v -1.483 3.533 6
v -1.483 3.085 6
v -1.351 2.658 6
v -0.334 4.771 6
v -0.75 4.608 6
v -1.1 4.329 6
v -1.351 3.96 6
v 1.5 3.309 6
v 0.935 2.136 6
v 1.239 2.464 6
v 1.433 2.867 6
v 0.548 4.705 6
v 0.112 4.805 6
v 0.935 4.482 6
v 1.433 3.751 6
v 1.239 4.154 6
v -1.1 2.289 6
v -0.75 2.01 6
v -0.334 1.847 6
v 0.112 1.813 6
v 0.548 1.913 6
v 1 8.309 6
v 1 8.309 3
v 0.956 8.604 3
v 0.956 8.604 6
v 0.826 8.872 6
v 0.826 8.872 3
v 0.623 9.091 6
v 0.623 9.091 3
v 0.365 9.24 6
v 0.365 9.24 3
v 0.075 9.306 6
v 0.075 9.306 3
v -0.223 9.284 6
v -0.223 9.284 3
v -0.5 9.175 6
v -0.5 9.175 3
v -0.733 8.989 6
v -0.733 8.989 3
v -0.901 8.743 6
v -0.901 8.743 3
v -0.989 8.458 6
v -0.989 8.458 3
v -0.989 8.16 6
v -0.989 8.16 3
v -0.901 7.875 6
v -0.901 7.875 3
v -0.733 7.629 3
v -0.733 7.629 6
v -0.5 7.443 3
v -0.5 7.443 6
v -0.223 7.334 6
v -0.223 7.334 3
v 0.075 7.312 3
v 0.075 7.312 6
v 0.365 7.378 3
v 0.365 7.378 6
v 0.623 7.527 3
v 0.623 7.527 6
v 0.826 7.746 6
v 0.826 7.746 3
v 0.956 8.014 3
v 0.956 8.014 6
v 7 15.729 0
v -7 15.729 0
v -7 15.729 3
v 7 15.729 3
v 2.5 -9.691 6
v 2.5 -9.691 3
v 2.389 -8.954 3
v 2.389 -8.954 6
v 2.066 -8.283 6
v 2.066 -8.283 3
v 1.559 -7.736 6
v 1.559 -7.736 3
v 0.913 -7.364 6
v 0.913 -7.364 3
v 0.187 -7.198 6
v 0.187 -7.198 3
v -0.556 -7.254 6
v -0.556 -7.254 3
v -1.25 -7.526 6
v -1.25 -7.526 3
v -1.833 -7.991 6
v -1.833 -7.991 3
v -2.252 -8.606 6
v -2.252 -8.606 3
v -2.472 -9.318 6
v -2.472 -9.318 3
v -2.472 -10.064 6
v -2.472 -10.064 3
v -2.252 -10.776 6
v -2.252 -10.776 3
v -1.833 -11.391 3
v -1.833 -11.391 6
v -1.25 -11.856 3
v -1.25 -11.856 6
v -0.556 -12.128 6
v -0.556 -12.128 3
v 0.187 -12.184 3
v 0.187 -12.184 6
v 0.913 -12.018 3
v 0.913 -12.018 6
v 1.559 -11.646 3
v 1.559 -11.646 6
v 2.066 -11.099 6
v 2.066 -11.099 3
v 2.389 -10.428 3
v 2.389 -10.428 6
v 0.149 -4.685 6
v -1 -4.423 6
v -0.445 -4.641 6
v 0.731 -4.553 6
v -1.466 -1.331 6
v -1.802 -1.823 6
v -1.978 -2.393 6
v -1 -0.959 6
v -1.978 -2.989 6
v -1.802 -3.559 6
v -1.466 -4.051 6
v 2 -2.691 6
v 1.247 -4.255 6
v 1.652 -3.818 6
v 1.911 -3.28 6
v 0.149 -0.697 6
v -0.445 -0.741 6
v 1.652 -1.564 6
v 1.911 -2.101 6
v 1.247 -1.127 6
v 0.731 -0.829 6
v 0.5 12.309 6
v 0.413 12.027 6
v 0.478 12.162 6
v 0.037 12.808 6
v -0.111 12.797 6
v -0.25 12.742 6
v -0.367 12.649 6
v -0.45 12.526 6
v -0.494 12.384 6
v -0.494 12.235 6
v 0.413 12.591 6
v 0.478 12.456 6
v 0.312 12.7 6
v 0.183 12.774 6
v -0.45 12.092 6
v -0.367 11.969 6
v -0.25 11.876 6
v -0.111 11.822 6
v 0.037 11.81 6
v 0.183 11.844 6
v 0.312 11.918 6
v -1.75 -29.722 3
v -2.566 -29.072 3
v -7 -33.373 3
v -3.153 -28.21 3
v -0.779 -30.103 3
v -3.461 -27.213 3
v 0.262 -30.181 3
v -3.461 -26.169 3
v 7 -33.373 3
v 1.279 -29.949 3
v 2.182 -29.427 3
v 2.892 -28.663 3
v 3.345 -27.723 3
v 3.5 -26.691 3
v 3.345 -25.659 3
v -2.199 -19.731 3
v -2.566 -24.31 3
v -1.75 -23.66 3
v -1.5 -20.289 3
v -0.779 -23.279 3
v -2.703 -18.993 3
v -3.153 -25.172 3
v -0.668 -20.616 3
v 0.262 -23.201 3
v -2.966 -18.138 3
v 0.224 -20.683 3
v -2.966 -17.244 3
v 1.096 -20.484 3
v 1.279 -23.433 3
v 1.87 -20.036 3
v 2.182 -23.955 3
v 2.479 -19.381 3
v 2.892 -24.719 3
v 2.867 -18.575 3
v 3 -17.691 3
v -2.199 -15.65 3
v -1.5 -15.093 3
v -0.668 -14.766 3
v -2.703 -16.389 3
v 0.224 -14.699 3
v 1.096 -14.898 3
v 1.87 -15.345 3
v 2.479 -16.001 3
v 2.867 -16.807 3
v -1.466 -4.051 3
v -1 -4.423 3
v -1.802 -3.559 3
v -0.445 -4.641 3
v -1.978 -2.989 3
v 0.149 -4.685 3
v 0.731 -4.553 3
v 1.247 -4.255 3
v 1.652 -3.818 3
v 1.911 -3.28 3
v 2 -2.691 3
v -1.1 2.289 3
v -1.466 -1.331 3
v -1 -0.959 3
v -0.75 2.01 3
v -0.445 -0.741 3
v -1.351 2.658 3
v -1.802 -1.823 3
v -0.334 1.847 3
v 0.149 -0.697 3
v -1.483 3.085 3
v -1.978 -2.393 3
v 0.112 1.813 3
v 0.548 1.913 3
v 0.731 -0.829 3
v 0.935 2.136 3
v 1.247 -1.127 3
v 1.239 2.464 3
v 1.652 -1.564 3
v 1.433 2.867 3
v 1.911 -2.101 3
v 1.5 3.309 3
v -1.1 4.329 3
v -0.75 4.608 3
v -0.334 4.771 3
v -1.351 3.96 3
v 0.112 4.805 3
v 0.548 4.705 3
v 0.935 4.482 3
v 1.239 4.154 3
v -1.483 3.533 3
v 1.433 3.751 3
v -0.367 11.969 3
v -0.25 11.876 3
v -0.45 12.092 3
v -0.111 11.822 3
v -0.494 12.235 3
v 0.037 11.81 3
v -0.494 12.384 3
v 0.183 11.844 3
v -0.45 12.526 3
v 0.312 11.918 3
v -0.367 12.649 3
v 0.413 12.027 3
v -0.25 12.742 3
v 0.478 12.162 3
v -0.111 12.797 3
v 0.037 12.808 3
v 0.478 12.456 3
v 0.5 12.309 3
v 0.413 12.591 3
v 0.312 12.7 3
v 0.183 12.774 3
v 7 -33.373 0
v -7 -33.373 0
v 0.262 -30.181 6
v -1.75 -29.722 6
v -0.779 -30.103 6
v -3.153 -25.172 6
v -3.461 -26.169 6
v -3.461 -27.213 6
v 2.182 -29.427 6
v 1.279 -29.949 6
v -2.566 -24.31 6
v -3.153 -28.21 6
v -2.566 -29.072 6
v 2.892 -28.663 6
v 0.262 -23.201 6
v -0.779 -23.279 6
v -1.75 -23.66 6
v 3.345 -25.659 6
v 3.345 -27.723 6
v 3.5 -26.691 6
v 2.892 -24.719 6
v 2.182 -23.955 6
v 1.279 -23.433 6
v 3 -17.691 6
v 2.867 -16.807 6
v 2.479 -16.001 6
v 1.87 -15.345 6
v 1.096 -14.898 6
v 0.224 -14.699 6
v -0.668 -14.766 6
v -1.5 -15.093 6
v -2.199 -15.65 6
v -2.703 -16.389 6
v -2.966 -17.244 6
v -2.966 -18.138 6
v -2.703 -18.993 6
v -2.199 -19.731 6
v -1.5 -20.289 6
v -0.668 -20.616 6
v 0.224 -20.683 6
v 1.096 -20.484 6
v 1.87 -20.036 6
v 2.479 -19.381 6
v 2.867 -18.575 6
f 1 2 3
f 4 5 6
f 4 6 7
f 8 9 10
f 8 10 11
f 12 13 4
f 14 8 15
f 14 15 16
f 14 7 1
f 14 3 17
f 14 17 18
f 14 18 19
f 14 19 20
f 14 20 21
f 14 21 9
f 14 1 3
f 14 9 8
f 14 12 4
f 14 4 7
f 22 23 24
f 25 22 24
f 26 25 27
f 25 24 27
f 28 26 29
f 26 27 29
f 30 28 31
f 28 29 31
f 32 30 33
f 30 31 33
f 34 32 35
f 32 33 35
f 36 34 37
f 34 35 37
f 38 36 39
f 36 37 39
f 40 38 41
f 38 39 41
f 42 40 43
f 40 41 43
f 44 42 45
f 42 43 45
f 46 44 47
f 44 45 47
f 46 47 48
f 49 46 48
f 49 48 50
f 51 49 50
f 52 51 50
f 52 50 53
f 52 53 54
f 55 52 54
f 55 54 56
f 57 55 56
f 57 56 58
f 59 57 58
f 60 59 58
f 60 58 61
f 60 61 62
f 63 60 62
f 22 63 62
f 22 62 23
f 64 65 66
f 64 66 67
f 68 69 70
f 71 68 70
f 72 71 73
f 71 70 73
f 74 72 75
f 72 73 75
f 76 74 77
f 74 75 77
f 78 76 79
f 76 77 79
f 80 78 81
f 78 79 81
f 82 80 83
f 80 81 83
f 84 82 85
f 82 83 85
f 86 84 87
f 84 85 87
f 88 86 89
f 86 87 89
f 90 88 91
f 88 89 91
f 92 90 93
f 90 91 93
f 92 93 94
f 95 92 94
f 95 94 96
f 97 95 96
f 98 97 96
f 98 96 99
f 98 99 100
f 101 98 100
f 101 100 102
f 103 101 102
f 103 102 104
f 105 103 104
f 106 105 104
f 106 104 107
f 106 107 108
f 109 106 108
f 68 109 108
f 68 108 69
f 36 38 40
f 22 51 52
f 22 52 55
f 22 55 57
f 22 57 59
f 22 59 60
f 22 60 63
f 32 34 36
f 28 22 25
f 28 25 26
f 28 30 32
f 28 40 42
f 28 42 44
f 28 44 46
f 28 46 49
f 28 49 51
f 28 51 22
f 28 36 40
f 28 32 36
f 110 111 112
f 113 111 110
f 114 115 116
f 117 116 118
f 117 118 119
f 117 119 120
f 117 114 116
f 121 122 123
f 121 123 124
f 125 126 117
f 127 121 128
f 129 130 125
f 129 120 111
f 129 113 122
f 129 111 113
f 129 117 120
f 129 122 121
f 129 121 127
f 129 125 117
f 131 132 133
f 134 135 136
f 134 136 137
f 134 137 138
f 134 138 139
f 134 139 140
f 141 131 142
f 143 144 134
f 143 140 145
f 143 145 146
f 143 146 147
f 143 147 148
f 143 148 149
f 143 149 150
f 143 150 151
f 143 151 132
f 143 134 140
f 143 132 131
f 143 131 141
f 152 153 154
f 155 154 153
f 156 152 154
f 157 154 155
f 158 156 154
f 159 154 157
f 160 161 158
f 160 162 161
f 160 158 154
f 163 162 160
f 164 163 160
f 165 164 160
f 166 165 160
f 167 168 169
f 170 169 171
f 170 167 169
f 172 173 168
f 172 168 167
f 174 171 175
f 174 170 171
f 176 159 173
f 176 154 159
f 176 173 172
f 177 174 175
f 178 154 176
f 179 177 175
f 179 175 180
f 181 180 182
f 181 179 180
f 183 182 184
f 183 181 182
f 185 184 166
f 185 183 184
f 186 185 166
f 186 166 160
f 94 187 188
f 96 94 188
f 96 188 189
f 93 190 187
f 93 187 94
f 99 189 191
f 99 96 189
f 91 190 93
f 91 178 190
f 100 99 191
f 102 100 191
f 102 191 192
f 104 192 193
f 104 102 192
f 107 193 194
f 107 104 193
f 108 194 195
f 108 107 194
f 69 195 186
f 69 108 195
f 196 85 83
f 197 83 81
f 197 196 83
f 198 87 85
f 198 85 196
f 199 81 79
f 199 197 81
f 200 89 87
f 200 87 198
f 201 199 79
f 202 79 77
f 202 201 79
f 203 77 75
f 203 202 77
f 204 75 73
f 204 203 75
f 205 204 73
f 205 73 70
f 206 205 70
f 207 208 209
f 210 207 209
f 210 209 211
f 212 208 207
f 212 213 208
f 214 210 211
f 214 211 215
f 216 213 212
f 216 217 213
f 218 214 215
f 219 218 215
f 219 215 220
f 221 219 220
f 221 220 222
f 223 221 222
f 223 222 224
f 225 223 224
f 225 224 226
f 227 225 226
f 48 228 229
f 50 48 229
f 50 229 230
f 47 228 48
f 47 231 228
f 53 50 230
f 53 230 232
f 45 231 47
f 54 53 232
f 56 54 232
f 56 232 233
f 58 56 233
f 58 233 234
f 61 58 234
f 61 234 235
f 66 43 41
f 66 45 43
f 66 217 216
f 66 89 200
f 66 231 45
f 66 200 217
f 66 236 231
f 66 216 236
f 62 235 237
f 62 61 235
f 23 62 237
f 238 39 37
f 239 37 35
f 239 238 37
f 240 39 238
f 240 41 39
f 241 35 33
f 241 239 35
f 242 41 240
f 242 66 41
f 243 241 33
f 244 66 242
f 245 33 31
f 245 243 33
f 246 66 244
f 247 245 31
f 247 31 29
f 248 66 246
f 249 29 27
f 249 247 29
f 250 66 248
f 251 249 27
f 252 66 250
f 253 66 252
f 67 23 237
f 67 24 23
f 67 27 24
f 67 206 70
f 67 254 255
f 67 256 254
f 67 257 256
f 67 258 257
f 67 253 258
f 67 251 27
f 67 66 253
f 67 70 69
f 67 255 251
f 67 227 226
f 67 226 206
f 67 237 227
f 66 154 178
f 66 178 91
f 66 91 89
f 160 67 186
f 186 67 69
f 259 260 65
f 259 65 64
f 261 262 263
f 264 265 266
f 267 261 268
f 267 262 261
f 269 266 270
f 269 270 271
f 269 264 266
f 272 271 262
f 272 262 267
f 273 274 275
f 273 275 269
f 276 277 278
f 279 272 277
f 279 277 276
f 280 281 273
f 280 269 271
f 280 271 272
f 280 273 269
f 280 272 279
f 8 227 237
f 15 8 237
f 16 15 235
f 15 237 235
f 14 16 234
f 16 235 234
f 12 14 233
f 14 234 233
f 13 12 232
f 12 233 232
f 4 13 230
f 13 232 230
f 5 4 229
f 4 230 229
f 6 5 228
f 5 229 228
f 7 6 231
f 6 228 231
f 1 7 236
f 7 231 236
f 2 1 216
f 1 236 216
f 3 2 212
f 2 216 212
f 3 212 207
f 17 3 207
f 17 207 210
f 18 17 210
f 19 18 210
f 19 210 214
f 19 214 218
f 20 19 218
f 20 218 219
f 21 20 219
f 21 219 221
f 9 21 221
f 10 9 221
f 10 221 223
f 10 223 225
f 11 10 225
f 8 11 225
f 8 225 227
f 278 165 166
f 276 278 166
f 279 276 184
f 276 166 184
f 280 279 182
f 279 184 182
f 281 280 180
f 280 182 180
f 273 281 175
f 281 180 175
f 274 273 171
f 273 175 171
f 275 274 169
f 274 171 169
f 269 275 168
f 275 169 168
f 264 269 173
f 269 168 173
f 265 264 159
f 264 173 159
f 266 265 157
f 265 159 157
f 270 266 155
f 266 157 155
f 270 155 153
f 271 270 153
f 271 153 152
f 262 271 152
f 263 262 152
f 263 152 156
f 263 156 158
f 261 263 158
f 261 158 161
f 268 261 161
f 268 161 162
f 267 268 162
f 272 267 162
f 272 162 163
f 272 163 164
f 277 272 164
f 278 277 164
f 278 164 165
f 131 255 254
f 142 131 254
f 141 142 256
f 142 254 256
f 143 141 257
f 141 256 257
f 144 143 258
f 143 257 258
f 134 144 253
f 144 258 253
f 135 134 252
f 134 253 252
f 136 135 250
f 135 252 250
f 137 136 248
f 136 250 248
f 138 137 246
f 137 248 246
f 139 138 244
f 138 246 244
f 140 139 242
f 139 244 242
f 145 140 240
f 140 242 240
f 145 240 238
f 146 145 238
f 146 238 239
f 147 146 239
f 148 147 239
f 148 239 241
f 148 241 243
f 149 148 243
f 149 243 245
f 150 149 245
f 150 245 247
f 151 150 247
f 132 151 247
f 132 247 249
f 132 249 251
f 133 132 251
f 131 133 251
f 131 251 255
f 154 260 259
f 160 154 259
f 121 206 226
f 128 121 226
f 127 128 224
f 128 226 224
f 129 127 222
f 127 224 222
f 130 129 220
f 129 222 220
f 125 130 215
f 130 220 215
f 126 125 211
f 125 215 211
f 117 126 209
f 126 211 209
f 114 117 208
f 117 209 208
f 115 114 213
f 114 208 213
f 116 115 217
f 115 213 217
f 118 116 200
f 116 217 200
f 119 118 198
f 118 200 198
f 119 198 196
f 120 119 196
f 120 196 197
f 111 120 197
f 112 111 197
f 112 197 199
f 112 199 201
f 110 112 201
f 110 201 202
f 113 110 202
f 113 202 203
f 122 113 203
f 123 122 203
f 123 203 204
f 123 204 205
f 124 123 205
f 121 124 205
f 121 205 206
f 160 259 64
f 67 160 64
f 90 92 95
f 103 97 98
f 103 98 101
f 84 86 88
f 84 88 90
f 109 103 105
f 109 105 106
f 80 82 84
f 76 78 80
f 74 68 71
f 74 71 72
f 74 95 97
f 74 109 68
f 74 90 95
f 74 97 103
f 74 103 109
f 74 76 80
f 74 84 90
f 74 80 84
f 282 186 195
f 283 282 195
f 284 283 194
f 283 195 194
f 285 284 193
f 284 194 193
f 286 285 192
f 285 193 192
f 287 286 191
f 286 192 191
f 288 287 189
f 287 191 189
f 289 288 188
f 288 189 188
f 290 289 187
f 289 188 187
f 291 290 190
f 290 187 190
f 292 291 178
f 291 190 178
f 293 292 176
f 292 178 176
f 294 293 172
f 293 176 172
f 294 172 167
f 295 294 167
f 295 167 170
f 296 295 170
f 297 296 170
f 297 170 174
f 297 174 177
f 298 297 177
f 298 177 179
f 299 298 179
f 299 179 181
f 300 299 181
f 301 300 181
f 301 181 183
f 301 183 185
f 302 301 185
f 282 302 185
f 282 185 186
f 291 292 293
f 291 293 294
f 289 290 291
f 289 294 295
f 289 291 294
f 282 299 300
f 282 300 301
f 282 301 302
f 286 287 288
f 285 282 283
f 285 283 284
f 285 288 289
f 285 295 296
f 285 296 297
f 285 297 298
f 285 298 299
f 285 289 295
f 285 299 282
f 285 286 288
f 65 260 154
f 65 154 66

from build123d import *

# Parameters (mm, degrees)
F0_W     = 14
F0_H     = 49.101681
F0_R     = 3.5
F0_R_2   = 3
F0_R_3   = 2.5
F0_R_4   = 2
F0_R_5   = 1.5
F0_R_6   = 1
F0_R_7   = 0.5
F1_DEPTH = 3
F2_DEPTH = 6


with BuildPart() as f1:
    # F0 (on Top) → F1 (new body)
    with BuildSketch(Plane.XY):
        with Locations((0, -8.822086)):
            Rectangle(F0_W, F0_H)
        with Locations((0, -26.690952)):
            Circle(F0_R, mode=Mode.SUBTRACT)
        with Locations((0, -17.690952)):
            Circle(F0_R_2, mode=Mode.SUBTRACT)
        with Locations((0, -9.690952)):
            Circle(F0_R_3, mode=Mode.SUBTRACT)
        with Locations((0, -2.690952)):
            Circle(F0_R_4, mode=Mode.SUBTRACT)
        with Locations((0, 3.309048)):
            Circle(F0_R_5, mode=Mode.SUBTRACT)
        with Locations((0, 8.309048)):
            Circle(F0_R_6, mode=Mode.SUBTRACT)
        with Locations((0, 12.309048)):
            Circle(F0_R_7, mode=Mode.SUBTRACT)
    extrude(amount=F1_DEPTH)

    # F0 (on Top) → F2 (join)
    with BuildSketch(Plane.XY):
        with Locations((0, -26.690952)):
            Circle(F0_R)
        with Locations((0, -17.690952)):
            Circle(F0_R_2)
        with Locations((0, -9.690952)):
            Circle(F0_R_3)
        with Locations((0, -2.690952)):
            Circle(F0_R_4)
        with Locations((0, 3.309048)):
            Circle(F0_R_5)
        with Locations((0, 8.309048)):
            Circle(F0_R_6)
        with Locations((0, 12.309048)):
            Circle(F0_R_7)
    extrude(amount=F2_DEPTH)


solid = f1.part
